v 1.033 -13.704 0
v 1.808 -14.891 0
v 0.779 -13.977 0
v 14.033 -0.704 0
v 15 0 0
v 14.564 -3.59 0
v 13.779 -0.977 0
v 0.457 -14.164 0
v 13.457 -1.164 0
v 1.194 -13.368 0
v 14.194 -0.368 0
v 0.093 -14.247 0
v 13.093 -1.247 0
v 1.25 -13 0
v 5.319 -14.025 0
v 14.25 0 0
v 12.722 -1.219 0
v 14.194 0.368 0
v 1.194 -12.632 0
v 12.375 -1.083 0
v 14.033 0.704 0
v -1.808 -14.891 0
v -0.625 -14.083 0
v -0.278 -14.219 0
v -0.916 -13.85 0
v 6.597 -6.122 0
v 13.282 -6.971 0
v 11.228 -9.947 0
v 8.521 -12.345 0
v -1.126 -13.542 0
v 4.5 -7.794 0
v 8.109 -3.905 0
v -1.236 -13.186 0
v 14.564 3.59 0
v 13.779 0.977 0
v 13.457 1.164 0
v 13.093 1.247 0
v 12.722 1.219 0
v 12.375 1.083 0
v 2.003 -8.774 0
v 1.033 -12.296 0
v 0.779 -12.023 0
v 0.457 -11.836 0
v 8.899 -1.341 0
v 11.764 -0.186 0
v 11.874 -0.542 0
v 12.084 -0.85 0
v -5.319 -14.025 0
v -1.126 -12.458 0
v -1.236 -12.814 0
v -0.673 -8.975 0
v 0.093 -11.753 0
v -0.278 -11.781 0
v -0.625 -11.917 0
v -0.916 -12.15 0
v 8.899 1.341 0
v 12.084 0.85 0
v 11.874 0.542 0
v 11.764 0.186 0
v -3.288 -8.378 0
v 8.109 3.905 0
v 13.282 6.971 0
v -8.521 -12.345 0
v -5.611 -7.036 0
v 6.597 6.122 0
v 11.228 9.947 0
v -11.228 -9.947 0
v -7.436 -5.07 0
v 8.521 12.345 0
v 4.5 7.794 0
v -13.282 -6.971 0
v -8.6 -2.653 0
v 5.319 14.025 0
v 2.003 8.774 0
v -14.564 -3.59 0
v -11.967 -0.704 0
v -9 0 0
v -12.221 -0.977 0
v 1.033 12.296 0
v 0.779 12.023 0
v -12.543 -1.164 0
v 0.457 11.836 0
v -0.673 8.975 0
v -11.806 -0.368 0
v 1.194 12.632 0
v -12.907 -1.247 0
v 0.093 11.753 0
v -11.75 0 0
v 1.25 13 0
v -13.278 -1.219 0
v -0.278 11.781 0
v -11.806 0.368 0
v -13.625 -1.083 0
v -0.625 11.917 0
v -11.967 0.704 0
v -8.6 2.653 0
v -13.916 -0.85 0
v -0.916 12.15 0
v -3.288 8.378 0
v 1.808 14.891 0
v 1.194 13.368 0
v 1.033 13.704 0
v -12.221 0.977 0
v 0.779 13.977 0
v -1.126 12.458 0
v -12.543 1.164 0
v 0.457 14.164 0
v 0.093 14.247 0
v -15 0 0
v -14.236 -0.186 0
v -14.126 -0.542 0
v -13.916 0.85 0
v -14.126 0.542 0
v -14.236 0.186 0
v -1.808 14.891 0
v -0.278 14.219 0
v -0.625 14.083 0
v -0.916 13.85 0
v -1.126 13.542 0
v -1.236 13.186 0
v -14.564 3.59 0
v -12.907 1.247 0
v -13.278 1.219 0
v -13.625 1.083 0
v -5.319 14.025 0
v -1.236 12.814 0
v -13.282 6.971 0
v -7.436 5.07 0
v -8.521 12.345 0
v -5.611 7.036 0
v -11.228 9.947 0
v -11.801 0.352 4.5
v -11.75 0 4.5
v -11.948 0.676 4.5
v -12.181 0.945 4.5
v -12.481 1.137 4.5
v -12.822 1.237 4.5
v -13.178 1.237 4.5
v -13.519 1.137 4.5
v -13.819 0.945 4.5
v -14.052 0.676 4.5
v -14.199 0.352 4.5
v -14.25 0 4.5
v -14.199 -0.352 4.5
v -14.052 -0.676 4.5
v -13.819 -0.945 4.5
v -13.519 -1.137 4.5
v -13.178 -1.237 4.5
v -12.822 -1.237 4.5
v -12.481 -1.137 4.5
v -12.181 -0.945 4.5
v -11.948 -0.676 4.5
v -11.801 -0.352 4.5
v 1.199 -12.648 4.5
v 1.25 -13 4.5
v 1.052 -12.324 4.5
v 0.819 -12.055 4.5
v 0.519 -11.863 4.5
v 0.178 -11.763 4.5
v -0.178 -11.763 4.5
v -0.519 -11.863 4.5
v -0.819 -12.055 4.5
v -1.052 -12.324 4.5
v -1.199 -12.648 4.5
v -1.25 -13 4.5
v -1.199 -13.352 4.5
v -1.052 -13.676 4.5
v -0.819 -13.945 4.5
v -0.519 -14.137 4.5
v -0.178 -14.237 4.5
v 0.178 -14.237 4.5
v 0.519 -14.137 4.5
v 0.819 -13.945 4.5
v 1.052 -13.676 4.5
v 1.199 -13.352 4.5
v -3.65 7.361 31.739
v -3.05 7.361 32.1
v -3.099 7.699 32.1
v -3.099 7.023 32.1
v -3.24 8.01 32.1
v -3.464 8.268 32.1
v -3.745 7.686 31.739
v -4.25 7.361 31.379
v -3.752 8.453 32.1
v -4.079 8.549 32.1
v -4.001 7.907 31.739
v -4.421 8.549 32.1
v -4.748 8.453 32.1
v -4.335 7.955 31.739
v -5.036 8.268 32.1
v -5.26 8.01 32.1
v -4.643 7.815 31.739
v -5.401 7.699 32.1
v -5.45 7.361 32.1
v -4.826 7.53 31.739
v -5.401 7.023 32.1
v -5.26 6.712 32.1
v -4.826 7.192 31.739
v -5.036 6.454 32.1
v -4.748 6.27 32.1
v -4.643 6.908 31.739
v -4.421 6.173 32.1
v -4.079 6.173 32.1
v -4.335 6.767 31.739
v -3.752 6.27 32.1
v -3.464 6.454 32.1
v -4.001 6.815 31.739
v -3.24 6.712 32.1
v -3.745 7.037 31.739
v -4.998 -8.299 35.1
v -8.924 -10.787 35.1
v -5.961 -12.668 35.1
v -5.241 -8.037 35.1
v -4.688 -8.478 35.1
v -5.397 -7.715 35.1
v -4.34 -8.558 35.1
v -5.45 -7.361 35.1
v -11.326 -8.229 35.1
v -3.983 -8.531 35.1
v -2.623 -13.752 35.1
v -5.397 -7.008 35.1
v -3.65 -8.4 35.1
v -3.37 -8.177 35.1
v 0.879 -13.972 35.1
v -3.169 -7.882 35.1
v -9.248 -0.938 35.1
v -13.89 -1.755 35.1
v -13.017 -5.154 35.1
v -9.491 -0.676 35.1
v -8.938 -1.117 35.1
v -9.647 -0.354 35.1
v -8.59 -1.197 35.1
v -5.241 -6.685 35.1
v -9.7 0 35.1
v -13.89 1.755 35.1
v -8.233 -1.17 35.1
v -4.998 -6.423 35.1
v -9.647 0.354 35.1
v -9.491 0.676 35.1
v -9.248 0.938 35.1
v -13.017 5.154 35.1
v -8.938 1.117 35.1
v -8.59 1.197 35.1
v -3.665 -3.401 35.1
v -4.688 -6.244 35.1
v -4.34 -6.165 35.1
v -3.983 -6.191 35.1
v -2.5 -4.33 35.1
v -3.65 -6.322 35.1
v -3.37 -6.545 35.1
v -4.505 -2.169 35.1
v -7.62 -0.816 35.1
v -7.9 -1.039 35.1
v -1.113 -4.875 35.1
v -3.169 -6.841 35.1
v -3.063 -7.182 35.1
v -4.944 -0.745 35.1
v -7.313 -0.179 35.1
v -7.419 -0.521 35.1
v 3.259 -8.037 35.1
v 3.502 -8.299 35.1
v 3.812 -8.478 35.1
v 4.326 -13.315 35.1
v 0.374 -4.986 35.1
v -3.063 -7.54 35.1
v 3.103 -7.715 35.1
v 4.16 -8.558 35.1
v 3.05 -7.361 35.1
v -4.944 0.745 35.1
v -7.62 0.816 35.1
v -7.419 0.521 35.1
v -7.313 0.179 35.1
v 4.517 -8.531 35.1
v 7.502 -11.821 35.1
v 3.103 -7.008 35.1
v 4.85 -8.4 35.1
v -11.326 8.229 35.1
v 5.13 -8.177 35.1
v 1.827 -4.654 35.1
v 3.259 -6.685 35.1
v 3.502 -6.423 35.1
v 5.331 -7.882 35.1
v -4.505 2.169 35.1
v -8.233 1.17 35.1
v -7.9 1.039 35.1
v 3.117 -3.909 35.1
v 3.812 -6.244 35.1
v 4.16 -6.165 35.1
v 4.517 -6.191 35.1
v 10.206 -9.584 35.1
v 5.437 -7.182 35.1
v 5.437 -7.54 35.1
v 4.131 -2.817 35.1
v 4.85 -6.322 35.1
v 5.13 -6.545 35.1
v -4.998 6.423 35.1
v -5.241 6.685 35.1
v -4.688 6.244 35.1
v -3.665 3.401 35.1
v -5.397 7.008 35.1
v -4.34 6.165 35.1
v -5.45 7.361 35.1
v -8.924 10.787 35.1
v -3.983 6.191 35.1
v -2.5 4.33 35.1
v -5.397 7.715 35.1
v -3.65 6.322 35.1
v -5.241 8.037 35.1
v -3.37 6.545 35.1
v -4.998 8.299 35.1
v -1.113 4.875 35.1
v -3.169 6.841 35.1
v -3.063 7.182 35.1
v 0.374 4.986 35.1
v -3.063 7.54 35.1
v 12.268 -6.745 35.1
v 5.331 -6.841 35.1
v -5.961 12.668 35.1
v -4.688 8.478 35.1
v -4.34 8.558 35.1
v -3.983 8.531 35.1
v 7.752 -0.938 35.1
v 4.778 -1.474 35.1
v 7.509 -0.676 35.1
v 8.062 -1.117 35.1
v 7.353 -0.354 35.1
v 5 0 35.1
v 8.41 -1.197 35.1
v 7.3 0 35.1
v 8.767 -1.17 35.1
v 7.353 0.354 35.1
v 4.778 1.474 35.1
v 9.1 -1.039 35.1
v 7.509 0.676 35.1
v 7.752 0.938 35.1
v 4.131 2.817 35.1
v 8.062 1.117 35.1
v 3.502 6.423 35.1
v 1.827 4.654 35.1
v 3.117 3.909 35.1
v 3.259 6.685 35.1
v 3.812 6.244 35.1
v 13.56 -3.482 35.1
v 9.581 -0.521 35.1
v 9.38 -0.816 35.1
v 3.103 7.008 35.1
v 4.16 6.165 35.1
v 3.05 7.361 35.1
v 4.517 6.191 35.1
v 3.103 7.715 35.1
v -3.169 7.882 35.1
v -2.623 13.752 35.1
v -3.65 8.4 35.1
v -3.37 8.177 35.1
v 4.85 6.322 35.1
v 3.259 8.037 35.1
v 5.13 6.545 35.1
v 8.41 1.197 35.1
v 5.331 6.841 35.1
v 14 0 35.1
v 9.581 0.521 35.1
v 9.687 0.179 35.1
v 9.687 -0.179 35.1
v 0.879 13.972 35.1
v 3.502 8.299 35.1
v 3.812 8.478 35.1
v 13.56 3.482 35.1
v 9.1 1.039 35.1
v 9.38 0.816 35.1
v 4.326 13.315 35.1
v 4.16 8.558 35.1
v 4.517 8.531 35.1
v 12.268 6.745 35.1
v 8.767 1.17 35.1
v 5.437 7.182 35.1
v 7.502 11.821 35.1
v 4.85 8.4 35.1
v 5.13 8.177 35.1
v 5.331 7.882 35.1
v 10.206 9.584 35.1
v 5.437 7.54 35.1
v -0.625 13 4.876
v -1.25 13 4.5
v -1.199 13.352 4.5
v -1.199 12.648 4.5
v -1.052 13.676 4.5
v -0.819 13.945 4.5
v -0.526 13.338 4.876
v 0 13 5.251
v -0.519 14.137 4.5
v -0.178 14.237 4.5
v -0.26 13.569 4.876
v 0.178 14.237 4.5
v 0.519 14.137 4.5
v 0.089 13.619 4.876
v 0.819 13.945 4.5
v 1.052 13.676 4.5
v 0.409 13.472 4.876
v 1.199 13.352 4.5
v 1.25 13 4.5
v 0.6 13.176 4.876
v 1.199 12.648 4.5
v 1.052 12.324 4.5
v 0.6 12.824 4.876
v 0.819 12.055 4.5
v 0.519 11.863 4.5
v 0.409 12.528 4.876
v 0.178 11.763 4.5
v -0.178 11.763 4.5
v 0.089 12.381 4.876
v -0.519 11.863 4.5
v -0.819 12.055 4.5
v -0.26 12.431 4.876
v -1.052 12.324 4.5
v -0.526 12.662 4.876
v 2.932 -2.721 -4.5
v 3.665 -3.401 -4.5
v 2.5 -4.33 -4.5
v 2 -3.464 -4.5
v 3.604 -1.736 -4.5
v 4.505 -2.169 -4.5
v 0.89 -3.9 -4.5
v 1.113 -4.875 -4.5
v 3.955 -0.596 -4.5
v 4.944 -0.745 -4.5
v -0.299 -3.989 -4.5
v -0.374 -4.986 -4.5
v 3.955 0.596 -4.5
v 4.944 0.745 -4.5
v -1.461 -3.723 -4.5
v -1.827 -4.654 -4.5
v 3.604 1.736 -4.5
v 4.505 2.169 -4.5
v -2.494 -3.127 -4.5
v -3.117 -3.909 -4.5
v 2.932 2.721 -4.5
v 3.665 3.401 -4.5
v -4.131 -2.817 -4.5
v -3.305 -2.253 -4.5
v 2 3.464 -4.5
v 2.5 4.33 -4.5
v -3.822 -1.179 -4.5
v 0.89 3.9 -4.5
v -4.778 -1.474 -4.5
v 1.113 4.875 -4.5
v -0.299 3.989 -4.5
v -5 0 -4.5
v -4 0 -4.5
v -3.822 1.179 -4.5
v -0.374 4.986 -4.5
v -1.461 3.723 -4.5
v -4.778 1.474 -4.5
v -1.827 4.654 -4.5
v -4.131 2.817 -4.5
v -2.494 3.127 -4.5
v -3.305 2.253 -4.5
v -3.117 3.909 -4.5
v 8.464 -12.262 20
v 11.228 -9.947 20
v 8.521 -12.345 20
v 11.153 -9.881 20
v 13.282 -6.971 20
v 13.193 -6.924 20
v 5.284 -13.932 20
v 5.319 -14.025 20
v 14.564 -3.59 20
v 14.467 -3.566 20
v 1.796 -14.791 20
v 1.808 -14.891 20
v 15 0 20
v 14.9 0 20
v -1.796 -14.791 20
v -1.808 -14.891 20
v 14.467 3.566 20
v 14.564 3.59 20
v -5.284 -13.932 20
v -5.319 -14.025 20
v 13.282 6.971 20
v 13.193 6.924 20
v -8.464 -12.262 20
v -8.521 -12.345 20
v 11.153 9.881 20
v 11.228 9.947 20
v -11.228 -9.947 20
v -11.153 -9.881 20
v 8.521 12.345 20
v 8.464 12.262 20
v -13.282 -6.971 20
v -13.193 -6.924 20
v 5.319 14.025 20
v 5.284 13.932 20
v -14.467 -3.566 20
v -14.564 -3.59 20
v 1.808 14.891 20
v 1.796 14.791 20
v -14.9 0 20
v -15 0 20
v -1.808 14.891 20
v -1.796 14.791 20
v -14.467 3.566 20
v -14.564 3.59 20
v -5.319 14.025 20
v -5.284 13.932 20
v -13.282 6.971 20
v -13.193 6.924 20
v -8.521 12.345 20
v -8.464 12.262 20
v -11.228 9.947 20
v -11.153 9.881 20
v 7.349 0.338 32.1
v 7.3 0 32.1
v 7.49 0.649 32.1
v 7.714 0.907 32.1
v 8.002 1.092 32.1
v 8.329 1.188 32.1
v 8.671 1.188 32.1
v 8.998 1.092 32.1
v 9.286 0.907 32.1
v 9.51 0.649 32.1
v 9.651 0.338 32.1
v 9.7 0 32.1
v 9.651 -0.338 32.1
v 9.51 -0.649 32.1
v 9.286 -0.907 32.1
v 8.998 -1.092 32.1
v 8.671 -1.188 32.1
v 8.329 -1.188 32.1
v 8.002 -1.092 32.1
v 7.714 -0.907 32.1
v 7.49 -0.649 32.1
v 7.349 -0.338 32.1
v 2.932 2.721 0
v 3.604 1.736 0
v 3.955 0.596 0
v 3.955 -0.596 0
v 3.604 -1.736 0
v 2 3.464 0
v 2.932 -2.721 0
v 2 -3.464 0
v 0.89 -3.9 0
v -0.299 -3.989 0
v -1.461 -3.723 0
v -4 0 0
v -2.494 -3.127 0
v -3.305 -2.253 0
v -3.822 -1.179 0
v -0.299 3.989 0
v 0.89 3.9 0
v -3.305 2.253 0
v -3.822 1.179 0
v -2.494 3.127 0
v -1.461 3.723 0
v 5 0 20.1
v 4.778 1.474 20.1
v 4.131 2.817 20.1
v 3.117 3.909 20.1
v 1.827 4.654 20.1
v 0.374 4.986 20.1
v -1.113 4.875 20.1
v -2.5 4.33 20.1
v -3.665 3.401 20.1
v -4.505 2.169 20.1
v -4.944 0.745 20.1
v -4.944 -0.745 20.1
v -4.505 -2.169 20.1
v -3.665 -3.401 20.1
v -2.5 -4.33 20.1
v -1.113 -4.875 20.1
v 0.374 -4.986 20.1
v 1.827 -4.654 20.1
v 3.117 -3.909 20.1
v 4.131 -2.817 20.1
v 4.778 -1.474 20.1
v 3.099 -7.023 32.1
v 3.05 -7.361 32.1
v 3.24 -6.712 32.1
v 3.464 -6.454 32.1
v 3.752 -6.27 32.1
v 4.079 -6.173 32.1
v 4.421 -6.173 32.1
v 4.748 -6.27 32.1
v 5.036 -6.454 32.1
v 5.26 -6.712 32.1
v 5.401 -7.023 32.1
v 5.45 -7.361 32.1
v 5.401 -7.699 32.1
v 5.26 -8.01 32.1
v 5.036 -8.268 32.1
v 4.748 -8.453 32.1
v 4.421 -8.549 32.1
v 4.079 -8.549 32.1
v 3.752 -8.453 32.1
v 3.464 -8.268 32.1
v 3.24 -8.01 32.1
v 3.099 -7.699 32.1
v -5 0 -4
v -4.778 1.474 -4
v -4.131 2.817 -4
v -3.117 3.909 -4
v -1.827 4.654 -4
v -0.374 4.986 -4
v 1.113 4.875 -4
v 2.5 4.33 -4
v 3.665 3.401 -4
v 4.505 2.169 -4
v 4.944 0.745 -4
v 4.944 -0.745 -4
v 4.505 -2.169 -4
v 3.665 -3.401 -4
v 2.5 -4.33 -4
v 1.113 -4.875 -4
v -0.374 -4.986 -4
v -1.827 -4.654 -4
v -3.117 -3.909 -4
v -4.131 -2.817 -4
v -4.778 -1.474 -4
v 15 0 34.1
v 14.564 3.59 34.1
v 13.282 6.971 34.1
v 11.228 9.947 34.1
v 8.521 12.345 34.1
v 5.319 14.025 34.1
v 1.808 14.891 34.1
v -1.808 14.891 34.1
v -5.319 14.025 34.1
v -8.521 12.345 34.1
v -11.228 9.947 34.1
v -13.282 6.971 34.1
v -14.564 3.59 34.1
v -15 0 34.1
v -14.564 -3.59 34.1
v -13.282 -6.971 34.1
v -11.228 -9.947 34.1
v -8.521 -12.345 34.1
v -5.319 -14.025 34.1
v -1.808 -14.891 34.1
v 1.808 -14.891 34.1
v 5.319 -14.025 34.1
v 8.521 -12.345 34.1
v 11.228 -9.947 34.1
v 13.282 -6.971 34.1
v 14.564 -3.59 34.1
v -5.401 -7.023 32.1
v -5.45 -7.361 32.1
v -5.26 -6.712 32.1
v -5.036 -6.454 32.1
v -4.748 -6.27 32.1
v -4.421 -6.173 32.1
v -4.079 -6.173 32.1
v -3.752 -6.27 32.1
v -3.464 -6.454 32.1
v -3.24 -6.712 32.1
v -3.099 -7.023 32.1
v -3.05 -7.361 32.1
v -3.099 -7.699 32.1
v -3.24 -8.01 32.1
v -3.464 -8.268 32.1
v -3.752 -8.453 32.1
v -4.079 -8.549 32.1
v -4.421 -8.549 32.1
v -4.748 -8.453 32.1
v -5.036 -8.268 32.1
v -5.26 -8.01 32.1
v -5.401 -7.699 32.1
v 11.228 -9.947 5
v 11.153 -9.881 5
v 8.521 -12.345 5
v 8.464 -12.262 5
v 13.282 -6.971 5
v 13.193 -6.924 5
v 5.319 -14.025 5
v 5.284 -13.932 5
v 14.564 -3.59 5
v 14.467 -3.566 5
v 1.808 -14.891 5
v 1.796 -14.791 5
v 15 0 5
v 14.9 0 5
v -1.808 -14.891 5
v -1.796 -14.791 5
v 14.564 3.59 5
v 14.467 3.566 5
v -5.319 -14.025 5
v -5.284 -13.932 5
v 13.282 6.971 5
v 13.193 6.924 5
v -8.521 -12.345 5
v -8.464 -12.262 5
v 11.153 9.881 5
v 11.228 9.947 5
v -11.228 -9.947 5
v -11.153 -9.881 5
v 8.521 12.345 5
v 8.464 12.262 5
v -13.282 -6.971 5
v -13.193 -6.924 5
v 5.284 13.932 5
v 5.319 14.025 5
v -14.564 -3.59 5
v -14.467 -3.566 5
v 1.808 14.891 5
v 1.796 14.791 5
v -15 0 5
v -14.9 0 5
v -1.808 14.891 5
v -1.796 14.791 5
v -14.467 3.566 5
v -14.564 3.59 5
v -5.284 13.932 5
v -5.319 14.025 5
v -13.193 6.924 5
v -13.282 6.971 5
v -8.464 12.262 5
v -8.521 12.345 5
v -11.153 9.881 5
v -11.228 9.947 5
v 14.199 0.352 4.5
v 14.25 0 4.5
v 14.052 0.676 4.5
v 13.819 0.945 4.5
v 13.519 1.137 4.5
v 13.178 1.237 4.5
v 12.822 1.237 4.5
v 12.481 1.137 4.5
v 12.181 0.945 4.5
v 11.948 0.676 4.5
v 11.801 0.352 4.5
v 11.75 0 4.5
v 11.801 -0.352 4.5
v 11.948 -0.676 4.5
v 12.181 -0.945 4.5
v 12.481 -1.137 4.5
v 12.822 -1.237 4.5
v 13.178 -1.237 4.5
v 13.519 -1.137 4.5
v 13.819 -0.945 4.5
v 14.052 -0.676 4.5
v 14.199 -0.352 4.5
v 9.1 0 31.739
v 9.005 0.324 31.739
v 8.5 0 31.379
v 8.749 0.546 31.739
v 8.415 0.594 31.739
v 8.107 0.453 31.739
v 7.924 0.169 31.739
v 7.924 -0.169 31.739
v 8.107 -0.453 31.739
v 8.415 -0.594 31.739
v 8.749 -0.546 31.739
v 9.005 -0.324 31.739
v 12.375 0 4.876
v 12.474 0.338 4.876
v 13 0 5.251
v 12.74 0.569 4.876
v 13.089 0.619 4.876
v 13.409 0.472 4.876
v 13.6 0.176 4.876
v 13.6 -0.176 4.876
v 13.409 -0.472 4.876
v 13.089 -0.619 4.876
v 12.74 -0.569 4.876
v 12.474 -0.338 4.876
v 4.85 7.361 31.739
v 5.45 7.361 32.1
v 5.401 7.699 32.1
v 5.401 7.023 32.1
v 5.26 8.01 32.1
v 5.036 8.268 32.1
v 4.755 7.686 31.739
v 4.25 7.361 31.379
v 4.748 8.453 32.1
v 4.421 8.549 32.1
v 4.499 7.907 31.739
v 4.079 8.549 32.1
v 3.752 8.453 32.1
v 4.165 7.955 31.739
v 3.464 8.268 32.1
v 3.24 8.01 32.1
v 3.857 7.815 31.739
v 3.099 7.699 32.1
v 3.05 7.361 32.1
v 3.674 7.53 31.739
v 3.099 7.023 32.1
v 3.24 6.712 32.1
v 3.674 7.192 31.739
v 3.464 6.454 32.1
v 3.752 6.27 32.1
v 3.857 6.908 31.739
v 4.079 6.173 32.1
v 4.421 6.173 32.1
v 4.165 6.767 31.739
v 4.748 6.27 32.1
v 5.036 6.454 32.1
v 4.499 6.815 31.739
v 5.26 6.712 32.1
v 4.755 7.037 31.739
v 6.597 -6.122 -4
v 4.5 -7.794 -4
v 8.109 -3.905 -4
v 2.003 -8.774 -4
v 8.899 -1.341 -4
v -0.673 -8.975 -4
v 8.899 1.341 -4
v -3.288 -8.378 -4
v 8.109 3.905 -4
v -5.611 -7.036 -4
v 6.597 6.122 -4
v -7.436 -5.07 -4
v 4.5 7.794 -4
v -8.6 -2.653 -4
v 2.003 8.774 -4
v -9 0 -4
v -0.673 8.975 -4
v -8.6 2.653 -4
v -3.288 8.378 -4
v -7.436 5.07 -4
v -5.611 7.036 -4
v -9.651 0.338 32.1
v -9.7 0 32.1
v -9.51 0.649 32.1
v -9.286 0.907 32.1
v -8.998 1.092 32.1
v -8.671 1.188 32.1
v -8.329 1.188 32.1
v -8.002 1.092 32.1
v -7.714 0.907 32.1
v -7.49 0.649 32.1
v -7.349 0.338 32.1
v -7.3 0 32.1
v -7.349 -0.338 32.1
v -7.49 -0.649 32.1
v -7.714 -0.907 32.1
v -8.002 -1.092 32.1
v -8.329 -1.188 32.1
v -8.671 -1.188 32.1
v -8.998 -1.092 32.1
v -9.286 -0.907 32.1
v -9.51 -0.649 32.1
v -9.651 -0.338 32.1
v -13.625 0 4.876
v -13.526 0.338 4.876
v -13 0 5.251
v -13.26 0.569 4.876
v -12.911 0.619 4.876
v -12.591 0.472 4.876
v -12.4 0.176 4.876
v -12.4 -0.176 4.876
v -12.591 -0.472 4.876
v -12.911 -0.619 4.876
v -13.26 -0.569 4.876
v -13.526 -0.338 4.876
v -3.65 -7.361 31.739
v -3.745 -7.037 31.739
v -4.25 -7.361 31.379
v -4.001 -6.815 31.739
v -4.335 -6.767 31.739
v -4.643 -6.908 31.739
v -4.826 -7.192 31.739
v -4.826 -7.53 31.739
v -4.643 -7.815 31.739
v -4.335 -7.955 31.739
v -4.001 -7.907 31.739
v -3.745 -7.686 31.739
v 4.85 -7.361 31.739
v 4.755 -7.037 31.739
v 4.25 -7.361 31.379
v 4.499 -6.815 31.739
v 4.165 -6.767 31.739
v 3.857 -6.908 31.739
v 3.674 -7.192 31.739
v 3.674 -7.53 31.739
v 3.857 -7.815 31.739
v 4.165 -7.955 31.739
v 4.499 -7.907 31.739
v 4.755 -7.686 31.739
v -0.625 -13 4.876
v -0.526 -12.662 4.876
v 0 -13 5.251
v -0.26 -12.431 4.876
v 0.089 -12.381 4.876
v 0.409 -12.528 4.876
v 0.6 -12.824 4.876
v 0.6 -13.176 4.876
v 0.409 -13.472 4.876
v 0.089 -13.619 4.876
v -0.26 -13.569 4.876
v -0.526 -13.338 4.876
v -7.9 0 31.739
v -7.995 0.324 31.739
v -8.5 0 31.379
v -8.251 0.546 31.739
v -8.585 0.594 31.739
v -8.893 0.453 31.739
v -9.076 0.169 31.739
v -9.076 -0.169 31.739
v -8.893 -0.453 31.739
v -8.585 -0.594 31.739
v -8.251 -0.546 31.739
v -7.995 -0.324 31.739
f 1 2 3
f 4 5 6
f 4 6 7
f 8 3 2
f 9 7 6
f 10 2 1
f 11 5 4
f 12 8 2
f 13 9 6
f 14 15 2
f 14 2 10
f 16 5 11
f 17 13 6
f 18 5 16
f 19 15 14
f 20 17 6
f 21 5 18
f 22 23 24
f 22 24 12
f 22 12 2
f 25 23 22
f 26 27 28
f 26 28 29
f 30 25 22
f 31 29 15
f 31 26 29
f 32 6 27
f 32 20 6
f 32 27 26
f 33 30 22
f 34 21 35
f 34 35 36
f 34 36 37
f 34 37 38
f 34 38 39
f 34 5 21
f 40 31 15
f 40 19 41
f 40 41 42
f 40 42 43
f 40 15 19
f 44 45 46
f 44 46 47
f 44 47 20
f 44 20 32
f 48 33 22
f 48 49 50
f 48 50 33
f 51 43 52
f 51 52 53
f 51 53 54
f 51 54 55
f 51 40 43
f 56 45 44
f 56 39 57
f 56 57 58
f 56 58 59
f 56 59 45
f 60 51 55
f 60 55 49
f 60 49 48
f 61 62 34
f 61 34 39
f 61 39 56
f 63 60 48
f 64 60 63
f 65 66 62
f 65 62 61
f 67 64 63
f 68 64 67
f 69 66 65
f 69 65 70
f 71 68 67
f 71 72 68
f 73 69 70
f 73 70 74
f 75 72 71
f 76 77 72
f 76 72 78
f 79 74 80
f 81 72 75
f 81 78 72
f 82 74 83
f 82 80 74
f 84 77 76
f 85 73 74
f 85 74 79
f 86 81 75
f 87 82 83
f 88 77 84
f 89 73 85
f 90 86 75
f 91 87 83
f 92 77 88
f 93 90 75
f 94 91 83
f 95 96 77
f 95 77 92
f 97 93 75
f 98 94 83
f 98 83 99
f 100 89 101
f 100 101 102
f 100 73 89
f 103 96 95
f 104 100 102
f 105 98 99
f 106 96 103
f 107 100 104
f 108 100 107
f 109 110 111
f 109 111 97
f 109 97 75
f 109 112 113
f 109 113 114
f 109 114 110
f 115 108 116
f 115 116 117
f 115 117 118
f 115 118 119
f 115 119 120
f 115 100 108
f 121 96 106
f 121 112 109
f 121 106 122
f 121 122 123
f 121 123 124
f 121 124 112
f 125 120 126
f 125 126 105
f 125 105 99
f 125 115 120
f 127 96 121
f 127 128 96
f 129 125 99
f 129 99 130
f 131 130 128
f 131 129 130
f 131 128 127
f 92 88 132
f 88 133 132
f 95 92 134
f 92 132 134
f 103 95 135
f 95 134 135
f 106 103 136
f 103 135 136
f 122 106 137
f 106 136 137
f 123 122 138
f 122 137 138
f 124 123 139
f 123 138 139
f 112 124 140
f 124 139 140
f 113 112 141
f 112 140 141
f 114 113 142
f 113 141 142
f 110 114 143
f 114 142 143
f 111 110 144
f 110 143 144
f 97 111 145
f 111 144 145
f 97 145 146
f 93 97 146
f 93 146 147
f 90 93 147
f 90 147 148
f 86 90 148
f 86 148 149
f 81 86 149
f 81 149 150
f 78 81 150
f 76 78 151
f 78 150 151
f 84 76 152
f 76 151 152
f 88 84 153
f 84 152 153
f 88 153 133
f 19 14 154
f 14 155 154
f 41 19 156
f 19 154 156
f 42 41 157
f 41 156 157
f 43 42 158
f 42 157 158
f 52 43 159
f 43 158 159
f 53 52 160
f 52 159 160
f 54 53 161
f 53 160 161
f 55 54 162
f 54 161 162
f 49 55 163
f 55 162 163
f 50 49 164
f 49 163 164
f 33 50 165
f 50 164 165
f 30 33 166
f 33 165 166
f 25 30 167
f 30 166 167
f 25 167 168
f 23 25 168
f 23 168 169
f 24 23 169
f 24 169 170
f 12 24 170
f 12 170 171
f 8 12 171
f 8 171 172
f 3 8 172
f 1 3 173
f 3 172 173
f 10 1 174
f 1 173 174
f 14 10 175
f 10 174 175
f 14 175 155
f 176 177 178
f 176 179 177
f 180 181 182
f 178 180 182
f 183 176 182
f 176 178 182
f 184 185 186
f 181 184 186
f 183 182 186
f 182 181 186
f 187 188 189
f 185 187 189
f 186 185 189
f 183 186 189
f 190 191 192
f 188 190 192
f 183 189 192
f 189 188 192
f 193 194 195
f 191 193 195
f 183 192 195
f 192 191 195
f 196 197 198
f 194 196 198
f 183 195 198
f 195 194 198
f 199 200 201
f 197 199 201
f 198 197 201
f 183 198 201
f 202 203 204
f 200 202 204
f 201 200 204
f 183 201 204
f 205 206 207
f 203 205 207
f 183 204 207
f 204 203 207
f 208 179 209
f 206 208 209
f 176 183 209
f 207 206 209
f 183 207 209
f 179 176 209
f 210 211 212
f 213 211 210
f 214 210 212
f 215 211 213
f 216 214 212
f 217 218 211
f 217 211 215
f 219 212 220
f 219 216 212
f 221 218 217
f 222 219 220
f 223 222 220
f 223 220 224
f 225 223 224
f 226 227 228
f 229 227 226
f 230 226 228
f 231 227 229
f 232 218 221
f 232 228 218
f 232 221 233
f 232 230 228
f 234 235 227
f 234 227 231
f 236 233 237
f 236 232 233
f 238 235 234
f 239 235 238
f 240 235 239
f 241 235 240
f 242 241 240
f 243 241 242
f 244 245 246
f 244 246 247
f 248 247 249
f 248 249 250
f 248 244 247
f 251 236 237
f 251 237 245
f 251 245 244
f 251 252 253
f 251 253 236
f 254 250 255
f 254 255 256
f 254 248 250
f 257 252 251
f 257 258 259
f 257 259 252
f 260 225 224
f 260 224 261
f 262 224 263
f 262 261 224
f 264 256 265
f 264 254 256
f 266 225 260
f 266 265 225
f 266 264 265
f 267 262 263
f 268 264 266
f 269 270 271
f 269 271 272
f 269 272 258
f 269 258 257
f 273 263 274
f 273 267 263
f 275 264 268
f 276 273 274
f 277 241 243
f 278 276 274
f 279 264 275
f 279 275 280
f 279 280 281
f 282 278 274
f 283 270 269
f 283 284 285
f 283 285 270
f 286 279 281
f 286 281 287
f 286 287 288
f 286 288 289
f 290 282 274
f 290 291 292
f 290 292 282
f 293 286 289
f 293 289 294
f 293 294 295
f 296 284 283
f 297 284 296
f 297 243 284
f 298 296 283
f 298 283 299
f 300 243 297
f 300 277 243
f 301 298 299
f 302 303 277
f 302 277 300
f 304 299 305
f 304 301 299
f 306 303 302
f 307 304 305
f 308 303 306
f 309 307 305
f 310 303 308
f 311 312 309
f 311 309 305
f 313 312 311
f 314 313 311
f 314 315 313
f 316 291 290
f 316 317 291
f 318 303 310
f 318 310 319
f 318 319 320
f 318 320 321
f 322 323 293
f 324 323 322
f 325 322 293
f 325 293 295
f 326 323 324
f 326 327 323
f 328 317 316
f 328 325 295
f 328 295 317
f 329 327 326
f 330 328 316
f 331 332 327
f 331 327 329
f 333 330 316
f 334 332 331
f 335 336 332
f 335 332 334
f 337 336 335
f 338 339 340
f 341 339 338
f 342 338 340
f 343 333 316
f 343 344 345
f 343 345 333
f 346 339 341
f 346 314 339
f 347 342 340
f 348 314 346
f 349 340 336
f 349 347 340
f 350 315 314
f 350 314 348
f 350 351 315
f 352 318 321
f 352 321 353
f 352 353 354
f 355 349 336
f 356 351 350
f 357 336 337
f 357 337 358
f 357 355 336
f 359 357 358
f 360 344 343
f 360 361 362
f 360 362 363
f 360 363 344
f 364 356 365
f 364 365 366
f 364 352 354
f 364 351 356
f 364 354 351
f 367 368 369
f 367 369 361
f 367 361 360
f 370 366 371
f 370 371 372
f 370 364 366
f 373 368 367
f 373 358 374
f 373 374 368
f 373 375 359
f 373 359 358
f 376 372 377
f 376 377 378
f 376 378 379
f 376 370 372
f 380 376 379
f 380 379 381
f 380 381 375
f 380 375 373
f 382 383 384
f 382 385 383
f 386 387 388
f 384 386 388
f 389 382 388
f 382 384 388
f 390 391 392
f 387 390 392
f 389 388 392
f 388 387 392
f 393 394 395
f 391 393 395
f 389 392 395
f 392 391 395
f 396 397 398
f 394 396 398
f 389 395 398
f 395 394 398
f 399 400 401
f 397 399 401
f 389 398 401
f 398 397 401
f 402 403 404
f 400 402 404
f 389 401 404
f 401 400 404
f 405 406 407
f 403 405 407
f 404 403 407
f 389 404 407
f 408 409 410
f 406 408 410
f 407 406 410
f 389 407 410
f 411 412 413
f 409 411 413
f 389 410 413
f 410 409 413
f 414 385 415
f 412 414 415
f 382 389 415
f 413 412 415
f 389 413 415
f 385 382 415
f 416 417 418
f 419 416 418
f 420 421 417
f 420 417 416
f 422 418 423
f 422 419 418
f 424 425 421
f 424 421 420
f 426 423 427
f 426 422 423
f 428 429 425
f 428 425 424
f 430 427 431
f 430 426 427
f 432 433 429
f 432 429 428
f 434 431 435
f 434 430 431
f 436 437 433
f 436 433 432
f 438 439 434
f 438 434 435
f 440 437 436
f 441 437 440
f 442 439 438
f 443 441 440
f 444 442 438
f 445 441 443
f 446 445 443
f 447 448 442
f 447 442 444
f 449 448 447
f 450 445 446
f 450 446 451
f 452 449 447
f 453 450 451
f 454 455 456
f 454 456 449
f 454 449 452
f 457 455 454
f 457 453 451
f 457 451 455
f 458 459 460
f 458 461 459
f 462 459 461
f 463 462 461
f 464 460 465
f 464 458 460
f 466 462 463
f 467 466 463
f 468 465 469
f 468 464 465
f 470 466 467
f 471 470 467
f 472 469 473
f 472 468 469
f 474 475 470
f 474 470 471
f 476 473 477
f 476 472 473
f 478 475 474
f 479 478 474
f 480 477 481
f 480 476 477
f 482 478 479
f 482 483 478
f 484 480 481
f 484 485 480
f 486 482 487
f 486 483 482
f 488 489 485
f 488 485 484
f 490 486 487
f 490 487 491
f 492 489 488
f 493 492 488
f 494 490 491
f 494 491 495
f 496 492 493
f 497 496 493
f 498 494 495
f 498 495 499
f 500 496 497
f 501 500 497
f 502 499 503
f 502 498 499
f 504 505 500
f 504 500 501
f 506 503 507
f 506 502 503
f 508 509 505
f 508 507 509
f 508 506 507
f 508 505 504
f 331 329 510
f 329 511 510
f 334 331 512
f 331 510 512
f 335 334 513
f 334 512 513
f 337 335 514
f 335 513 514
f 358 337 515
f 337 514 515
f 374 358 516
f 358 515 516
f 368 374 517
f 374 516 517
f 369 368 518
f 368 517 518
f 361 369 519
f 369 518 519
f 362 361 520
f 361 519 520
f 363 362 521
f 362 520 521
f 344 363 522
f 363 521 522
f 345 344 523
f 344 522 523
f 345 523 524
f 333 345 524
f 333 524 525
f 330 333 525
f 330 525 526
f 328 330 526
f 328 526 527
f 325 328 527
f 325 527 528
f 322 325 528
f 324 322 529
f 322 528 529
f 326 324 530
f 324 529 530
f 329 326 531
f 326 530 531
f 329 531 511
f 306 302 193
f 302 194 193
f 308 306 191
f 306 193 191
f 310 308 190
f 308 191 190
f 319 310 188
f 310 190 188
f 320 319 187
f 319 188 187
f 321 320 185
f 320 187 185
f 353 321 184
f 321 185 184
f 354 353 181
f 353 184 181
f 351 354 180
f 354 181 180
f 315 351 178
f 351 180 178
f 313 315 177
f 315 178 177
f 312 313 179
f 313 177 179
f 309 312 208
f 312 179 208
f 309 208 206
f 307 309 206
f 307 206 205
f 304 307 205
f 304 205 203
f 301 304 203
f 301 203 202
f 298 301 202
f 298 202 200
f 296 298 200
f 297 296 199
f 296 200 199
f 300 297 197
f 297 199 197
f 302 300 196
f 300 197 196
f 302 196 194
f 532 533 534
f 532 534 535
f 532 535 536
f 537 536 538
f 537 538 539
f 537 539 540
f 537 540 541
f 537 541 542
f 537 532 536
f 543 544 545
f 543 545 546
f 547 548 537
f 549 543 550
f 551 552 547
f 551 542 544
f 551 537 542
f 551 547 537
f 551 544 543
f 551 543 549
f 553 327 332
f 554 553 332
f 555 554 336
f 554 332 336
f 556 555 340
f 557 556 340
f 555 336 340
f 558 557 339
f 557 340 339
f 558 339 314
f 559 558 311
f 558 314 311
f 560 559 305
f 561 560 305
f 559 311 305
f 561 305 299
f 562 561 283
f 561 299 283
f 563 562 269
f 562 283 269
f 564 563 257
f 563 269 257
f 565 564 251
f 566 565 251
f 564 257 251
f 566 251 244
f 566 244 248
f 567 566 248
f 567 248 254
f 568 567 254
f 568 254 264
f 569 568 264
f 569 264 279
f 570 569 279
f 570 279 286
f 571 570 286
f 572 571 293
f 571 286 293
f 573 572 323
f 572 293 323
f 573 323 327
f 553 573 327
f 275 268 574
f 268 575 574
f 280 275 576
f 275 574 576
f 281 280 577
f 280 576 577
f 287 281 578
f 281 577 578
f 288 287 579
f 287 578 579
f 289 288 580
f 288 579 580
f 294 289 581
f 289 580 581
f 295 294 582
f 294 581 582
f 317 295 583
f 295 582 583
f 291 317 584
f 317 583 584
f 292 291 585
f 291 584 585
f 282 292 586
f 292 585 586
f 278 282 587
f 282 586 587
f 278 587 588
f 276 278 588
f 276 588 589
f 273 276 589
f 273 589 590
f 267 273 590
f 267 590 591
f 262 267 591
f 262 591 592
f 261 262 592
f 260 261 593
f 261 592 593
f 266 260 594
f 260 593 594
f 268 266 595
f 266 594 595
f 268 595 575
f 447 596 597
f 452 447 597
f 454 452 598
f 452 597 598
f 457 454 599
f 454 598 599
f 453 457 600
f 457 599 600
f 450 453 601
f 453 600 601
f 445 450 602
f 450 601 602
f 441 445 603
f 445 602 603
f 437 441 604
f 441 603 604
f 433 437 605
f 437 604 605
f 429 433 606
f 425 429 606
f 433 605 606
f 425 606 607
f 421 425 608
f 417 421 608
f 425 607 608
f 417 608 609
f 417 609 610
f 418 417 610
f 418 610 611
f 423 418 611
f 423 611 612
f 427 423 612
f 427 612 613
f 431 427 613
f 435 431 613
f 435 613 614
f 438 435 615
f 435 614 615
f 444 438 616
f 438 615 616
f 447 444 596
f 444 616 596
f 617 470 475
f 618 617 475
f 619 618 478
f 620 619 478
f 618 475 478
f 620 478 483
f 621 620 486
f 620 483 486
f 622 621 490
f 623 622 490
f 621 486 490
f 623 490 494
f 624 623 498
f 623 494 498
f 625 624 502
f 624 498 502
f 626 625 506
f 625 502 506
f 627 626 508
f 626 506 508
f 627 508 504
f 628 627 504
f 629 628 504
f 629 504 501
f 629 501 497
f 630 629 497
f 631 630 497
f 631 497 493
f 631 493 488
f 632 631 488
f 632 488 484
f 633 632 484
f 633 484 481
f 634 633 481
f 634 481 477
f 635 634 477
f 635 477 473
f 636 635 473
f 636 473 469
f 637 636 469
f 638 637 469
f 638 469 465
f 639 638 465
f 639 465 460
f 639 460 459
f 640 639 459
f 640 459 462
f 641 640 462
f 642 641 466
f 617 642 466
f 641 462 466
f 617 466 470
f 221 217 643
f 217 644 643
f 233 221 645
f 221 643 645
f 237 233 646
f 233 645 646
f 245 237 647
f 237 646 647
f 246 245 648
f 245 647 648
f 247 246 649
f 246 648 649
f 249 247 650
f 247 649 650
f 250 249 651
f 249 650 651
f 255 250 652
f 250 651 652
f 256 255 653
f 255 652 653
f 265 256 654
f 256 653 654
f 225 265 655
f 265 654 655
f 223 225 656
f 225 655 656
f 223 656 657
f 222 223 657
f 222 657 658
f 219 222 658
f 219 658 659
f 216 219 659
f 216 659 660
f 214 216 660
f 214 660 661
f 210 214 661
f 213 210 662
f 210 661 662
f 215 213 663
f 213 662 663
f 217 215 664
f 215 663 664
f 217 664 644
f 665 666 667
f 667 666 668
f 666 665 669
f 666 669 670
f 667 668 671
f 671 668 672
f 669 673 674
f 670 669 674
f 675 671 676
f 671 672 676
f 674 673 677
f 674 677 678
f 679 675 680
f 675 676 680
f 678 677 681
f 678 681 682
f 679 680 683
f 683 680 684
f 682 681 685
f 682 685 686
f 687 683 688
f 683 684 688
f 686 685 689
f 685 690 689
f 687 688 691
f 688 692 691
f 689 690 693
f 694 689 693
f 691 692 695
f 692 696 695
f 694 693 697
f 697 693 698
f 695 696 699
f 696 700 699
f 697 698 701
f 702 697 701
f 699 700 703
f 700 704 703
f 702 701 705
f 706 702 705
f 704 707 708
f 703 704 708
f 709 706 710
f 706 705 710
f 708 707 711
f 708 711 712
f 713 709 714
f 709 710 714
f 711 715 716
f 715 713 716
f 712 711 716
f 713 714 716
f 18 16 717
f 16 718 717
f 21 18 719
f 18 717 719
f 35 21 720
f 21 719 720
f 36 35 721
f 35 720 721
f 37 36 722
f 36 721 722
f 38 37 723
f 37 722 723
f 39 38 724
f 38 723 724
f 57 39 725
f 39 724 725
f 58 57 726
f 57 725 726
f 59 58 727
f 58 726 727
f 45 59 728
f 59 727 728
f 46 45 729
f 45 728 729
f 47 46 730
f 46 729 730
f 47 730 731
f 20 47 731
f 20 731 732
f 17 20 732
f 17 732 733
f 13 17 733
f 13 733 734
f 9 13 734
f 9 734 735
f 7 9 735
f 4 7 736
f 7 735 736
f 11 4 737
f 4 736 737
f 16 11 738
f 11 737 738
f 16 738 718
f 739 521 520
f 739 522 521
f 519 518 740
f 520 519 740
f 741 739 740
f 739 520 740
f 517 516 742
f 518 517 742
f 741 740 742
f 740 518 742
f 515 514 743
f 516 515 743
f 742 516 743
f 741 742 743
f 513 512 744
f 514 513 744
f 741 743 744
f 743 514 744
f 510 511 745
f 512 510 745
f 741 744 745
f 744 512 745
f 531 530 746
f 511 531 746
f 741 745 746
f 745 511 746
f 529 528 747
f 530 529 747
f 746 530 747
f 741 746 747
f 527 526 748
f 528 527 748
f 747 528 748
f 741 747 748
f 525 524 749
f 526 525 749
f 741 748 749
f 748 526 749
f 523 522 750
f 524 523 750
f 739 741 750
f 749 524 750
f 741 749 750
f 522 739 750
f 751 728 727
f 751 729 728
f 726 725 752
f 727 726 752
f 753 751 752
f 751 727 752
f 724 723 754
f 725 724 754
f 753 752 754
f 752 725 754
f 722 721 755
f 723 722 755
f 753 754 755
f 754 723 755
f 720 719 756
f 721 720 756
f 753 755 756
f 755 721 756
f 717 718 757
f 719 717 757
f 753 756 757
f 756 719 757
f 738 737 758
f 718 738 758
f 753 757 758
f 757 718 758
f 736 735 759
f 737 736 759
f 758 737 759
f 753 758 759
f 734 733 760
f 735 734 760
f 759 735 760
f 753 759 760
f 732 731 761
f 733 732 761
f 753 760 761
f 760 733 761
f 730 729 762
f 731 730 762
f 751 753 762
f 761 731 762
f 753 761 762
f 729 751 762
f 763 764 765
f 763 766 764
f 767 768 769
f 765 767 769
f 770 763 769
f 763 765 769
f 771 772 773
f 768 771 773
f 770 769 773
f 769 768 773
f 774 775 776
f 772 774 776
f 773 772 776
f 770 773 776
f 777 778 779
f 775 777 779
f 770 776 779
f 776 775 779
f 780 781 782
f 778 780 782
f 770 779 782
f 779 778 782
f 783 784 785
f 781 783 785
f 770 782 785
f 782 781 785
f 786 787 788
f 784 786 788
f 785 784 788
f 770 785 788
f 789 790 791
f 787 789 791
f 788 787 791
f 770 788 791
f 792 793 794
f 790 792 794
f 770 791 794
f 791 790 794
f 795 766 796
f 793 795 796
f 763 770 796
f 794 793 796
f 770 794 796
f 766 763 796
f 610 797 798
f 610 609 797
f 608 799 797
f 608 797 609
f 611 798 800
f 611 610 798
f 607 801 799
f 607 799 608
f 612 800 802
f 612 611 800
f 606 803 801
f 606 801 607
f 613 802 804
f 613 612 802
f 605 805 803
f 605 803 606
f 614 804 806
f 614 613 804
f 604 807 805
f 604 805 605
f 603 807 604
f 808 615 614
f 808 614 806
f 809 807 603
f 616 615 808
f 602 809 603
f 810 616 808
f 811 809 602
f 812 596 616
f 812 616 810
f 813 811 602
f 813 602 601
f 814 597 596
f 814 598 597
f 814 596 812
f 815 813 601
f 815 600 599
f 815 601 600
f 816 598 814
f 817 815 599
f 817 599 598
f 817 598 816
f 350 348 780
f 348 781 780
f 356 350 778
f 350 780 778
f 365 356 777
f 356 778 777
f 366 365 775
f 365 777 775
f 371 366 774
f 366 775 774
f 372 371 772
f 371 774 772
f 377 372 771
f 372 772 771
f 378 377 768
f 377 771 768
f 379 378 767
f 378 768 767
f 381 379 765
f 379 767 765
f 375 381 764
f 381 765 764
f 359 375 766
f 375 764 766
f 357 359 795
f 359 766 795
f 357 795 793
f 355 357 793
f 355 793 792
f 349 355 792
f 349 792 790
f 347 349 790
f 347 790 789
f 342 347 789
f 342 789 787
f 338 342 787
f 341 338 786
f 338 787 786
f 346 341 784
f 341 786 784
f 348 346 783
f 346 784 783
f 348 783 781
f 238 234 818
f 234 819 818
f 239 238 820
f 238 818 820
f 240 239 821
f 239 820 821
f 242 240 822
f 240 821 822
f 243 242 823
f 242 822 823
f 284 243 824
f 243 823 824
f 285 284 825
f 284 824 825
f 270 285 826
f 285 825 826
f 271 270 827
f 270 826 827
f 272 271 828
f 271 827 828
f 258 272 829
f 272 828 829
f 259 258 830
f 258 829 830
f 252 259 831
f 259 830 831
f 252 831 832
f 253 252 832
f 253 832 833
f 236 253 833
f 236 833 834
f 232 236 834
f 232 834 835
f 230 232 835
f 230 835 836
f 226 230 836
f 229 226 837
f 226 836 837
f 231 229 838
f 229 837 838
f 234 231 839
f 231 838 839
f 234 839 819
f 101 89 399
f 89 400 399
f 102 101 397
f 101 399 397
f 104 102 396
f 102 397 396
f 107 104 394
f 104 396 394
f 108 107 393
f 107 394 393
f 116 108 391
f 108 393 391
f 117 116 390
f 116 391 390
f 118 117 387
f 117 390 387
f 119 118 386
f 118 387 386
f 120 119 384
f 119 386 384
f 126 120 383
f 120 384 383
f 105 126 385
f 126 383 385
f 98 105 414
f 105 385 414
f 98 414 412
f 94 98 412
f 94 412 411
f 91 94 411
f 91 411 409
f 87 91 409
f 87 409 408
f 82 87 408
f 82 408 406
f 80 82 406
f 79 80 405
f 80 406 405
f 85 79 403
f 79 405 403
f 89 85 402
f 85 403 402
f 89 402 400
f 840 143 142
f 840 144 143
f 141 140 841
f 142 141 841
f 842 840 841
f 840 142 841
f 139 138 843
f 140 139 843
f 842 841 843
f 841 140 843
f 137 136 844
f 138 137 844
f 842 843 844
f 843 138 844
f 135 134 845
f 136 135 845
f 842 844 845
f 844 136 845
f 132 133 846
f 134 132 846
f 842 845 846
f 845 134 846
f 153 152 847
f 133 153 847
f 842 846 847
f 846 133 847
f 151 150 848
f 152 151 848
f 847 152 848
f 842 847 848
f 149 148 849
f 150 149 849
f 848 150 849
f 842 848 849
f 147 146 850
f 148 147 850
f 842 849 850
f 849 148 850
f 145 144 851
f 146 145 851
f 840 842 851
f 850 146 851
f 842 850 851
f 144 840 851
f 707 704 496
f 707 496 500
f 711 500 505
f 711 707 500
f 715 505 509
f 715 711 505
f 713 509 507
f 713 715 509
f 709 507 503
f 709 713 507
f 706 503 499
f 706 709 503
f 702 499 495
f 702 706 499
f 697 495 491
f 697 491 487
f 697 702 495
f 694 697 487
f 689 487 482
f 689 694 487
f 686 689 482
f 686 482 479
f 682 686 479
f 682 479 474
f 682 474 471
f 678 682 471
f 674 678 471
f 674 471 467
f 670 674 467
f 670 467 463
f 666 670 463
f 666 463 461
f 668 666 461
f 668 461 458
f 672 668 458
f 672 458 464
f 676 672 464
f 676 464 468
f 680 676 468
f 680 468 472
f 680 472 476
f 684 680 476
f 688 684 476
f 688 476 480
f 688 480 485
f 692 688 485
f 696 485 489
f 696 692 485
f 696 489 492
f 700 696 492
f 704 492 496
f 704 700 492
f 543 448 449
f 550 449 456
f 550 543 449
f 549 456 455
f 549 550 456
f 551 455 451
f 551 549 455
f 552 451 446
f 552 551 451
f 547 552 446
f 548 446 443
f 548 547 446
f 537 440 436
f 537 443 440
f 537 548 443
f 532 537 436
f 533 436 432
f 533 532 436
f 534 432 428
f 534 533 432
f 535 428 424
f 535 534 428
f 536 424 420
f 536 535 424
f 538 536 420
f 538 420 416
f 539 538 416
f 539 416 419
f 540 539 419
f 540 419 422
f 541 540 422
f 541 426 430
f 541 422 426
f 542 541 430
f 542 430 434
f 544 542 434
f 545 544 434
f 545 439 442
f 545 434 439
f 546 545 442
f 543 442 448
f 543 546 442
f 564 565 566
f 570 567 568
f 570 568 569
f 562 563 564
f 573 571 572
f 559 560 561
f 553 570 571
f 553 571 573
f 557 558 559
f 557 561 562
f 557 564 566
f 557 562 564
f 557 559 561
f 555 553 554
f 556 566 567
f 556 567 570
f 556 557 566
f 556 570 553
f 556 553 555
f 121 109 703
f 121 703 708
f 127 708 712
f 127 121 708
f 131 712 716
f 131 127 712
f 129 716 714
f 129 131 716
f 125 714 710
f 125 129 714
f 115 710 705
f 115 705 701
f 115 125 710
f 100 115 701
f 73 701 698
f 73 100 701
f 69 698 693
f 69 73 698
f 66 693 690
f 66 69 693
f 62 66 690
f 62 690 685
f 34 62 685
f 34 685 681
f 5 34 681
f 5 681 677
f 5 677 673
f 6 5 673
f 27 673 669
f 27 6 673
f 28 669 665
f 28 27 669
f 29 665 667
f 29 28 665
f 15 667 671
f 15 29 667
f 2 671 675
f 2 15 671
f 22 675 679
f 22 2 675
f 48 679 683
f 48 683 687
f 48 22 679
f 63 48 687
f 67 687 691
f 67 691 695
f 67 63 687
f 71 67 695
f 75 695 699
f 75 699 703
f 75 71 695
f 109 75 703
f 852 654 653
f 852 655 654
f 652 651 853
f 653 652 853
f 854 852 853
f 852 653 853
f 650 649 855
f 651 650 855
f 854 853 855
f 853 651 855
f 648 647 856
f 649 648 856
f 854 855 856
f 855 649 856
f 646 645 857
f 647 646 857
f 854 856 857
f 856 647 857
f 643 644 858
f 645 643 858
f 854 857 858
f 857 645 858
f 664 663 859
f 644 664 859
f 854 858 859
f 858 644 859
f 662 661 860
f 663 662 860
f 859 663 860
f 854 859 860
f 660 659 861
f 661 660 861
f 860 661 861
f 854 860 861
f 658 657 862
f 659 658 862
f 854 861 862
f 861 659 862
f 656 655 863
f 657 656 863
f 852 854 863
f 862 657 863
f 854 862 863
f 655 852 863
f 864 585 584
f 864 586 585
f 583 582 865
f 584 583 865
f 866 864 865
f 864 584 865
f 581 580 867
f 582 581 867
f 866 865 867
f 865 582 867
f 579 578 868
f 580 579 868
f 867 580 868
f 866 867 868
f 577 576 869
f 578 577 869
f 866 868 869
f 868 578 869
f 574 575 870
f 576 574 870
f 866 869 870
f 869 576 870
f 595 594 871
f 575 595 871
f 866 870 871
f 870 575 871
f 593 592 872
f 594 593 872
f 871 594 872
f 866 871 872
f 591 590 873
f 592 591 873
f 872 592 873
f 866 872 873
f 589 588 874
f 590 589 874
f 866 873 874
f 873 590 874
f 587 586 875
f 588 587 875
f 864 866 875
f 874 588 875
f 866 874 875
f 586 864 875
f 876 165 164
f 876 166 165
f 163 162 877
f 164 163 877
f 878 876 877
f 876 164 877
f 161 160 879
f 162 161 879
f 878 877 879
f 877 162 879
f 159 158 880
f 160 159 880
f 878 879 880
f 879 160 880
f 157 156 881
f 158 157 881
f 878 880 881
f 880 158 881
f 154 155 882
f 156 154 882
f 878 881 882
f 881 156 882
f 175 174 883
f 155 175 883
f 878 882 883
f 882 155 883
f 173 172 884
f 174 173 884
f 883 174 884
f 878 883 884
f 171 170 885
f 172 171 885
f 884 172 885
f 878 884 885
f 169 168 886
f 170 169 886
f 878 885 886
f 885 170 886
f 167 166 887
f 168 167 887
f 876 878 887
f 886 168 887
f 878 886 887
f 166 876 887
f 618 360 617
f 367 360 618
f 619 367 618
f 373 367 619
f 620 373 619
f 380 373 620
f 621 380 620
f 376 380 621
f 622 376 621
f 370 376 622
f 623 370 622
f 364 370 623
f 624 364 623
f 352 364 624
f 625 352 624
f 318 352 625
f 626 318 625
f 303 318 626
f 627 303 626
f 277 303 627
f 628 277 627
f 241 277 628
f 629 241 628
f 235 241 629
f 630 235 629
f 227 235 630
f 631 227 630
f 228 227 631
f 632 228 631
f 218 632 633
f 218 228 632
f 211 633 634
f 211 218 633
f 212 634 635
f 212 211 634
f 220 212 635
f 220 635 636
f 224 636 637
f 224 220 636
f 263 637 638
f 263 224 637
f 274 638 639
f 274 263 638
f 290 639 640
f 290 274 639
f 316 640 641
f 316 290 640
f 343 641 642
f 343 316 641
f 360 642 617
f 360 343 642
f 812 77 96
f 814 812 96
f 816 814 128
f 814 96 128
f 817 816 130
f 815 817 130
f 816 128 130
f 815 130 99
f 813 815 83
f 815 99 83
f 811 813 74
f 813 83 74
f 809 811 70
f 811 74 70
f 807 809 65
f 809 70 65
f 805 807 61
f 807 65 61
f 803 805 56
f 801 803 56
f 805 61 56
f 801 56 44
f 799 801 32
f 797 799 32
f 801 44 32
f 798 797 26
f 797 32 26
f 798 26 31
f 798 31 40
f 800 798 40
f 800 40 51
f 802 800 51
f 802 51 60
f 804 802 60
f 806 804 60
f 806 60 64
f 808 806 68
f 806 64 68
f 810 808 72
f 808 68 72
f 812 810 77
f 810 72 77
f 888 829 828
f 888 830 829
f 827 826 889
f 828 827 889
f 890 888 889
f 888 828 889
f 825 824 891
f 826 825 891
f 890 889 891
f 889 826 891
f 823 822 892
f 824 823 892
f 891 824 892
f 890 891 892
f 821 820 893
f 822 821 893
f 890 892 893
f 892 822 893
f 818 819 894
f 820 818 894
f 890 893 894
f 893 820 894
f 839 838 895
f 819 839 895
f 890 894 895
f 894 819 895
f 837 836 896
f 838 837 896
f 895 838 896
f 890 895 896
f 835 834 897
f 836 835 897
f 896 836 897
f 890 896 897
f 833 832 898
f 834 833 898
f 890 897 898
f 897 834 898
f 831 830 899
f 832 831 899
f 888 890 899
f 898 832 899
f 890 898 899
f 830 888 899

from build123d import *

# Parameters (mm, degrees)
ESQUISSE1_R             = 15
EXTRUSION1_DEPTH        = 35.1
ESQUISSE2_R             = 9
EXTRUSION2_DEPTH        = 4
ESQUISSE3_R             = 5
EXTRUSION3_DEPTH        = 0.5
CHANFREIN1_SIZE         = 1
ENL_V_MAT_EXTRU_1_REACH = 6.5
ESQUISSE7_R             = 4
ESQUISSE8_R             = 15
ESQUISSE8_R_2           = 14.9
ENL_V_MAT_EXTRU_2_DEPTH = 20
ESQUISSE9_R             = 15
EXTRUSION4_DEPTH        = 5
TROU_TARAUD_M31_D       = 2.5
TROU_TARAUD_M31_DEPTH   = 4.5
TROU_TARAUD_M31_TIP     = 0.751075774
ESQUISSE10_R            = 5
ENL_V_MAT_EXTRU_3_DEPTH = 15
D_GAGEMENT_M21_D        = 2.4
D_GAGEMENT_M21_DEPTH    = 3
D_GAGEMENT_M21_TIP      = 0.721032743


with BuildPart() as part:
    # Esquisse1 → Extrusion1 (new body)
    with BuildSketch(Plane.XY):
        Circle(ESQUISSE1_R)
    extrude(amount=EXTRUSION1_DEPTH)

    # Esquisse2 → Extrusion2 (add)
    with BuildSketch(Plane(origin=(0, 0, 0), x_dir=(-1, 0, 0), z_dir=(0, 0, -1))):
        Circle(ESQUISSE2_R)
    extrude(amount=EXTRUSION2_DEPTH)

    # Esquisse3 → Extrusion3 (add)
    with BuildSketch(Plane(origin=(0, 0, -4), x_dir=(-1, 0, 0), z_dir=(0, 0, -1))):
        Circle(ESQUISSE3_R)
    extrude(amount=EXTRUSION3_DEPTH)

    # Chanfrein1
    chanfrein1_edges = [part.edges().sort_by_distance(p)[0] for p in [
        (-15, 0, 35.1),
    ]]
    chamfer(chanfrein1_edges, length=CHANFREIN1_SIZE)

    # Esquisse7 → Enlèv. mat.-Extru.1 (cut, up to next)
    with BuildSketch(Plane(origin=(0, 0, 0), x_dir=(-1, 0, 0), z_dir=(0, 0, -1)), mode=Mode.PRIVATE) as enl_v_mat_extru_1_sk1:
        Circle(ESQUISSE7_R)
    enl_v_mat_extru_1_tool1 = extrude(enl_v_mat_extru_1_sk1.sketch, amount=ENL_V_MAT_EXTRU_1_REACH, mode=Mode.PRIVATE) & part.part
    add(enl_v_mat_extru_1_tool1.solids().sort_by_distance((0, 0, 0))[0], mode=Mode.SUBTRACT)

    # Esquisse8 → Enlèv. mat.-Extru.2 (cut)
    with BuildSketch(Plane(origin=(0, 0, 0), x_dir=(-1, 0, 0), z_dir=(0, 0, -1))):
        Circle(ESQUISSE8_R)
        Circle(ESQUISSE8_R_2, mode=Mode.SUBTRACT)
    extrude(amount=-ENL_V_MAT_EXTRU_2_DEPTH, mode=Mode.SUBTRACT)

    # Esquisse9 → Extrusion4 (add)
    with BuildSketch(Plane(origin=(0, 0, 0), x_dir=(-1, 0, 0), z_dir=(0, 0, -1))):
        Circle(ESQUISSE9_R)
    extrude(amount=-EXTRUSION4_DEPTH)

    # Trou taraudé M31
    with Locations(Plane(origin=(0, 0, 0), x_dir=(-1, 0, 0), z_dir=(0, 0, -1))):
        with Locations((13, 0), (0, 13), (-13, 0), (0, -13)):
            Hole(TROU_TARAUD_M31_D / 2, depth=TROU_TARAUD_M31_DEPTH)
            with Locations((0, 0, -(TROU_TARAUD_M31_DEPTH + TROU_TARAUD_M31_TIP / 2))):  # 118° drill point
                Cone(0, TROU_TARAUD_M31_D / 2, TROU_TARAUD_M31_TIP, mode=Mode.SUBTRACT)

    # Esquisse10 → Enlèv. mat.-Extru.3 (cut)
    with BuildSketch(Plane.XY.offset(35.1)):
        Circle(ESQUISSE10_R)
    extrude(amount=-ENL_V_MAT_EXTRU_3_DEPTH, mode=Mode.SUBTRACT)

    # Dégagement M21
    with Locations(Plane.XY.offset(35.1)):
        with Locations((4.25, -7.361215932), (-4.25, -7.361215932), (-8.5, 0), (-4.25, 7.361215932), (4.25, 7.361215932), (8.5, 0)):
            Hole(D_GAGEMENT_M21_D / 2, depth=D_GAGEMENT_M21_DEPTH)
            with Locations((0, 0, -(D_GAGEMENT_M21_DEPTH + D_GAGEMENT_M21_TIP / 2))):  # 118° drill point
                Cone(0, D_GAGEMENT_M21_D / 2, D_GAGEMENT_M21_TIP, mode=Mode.SUBTRACT)


solid = part.part
